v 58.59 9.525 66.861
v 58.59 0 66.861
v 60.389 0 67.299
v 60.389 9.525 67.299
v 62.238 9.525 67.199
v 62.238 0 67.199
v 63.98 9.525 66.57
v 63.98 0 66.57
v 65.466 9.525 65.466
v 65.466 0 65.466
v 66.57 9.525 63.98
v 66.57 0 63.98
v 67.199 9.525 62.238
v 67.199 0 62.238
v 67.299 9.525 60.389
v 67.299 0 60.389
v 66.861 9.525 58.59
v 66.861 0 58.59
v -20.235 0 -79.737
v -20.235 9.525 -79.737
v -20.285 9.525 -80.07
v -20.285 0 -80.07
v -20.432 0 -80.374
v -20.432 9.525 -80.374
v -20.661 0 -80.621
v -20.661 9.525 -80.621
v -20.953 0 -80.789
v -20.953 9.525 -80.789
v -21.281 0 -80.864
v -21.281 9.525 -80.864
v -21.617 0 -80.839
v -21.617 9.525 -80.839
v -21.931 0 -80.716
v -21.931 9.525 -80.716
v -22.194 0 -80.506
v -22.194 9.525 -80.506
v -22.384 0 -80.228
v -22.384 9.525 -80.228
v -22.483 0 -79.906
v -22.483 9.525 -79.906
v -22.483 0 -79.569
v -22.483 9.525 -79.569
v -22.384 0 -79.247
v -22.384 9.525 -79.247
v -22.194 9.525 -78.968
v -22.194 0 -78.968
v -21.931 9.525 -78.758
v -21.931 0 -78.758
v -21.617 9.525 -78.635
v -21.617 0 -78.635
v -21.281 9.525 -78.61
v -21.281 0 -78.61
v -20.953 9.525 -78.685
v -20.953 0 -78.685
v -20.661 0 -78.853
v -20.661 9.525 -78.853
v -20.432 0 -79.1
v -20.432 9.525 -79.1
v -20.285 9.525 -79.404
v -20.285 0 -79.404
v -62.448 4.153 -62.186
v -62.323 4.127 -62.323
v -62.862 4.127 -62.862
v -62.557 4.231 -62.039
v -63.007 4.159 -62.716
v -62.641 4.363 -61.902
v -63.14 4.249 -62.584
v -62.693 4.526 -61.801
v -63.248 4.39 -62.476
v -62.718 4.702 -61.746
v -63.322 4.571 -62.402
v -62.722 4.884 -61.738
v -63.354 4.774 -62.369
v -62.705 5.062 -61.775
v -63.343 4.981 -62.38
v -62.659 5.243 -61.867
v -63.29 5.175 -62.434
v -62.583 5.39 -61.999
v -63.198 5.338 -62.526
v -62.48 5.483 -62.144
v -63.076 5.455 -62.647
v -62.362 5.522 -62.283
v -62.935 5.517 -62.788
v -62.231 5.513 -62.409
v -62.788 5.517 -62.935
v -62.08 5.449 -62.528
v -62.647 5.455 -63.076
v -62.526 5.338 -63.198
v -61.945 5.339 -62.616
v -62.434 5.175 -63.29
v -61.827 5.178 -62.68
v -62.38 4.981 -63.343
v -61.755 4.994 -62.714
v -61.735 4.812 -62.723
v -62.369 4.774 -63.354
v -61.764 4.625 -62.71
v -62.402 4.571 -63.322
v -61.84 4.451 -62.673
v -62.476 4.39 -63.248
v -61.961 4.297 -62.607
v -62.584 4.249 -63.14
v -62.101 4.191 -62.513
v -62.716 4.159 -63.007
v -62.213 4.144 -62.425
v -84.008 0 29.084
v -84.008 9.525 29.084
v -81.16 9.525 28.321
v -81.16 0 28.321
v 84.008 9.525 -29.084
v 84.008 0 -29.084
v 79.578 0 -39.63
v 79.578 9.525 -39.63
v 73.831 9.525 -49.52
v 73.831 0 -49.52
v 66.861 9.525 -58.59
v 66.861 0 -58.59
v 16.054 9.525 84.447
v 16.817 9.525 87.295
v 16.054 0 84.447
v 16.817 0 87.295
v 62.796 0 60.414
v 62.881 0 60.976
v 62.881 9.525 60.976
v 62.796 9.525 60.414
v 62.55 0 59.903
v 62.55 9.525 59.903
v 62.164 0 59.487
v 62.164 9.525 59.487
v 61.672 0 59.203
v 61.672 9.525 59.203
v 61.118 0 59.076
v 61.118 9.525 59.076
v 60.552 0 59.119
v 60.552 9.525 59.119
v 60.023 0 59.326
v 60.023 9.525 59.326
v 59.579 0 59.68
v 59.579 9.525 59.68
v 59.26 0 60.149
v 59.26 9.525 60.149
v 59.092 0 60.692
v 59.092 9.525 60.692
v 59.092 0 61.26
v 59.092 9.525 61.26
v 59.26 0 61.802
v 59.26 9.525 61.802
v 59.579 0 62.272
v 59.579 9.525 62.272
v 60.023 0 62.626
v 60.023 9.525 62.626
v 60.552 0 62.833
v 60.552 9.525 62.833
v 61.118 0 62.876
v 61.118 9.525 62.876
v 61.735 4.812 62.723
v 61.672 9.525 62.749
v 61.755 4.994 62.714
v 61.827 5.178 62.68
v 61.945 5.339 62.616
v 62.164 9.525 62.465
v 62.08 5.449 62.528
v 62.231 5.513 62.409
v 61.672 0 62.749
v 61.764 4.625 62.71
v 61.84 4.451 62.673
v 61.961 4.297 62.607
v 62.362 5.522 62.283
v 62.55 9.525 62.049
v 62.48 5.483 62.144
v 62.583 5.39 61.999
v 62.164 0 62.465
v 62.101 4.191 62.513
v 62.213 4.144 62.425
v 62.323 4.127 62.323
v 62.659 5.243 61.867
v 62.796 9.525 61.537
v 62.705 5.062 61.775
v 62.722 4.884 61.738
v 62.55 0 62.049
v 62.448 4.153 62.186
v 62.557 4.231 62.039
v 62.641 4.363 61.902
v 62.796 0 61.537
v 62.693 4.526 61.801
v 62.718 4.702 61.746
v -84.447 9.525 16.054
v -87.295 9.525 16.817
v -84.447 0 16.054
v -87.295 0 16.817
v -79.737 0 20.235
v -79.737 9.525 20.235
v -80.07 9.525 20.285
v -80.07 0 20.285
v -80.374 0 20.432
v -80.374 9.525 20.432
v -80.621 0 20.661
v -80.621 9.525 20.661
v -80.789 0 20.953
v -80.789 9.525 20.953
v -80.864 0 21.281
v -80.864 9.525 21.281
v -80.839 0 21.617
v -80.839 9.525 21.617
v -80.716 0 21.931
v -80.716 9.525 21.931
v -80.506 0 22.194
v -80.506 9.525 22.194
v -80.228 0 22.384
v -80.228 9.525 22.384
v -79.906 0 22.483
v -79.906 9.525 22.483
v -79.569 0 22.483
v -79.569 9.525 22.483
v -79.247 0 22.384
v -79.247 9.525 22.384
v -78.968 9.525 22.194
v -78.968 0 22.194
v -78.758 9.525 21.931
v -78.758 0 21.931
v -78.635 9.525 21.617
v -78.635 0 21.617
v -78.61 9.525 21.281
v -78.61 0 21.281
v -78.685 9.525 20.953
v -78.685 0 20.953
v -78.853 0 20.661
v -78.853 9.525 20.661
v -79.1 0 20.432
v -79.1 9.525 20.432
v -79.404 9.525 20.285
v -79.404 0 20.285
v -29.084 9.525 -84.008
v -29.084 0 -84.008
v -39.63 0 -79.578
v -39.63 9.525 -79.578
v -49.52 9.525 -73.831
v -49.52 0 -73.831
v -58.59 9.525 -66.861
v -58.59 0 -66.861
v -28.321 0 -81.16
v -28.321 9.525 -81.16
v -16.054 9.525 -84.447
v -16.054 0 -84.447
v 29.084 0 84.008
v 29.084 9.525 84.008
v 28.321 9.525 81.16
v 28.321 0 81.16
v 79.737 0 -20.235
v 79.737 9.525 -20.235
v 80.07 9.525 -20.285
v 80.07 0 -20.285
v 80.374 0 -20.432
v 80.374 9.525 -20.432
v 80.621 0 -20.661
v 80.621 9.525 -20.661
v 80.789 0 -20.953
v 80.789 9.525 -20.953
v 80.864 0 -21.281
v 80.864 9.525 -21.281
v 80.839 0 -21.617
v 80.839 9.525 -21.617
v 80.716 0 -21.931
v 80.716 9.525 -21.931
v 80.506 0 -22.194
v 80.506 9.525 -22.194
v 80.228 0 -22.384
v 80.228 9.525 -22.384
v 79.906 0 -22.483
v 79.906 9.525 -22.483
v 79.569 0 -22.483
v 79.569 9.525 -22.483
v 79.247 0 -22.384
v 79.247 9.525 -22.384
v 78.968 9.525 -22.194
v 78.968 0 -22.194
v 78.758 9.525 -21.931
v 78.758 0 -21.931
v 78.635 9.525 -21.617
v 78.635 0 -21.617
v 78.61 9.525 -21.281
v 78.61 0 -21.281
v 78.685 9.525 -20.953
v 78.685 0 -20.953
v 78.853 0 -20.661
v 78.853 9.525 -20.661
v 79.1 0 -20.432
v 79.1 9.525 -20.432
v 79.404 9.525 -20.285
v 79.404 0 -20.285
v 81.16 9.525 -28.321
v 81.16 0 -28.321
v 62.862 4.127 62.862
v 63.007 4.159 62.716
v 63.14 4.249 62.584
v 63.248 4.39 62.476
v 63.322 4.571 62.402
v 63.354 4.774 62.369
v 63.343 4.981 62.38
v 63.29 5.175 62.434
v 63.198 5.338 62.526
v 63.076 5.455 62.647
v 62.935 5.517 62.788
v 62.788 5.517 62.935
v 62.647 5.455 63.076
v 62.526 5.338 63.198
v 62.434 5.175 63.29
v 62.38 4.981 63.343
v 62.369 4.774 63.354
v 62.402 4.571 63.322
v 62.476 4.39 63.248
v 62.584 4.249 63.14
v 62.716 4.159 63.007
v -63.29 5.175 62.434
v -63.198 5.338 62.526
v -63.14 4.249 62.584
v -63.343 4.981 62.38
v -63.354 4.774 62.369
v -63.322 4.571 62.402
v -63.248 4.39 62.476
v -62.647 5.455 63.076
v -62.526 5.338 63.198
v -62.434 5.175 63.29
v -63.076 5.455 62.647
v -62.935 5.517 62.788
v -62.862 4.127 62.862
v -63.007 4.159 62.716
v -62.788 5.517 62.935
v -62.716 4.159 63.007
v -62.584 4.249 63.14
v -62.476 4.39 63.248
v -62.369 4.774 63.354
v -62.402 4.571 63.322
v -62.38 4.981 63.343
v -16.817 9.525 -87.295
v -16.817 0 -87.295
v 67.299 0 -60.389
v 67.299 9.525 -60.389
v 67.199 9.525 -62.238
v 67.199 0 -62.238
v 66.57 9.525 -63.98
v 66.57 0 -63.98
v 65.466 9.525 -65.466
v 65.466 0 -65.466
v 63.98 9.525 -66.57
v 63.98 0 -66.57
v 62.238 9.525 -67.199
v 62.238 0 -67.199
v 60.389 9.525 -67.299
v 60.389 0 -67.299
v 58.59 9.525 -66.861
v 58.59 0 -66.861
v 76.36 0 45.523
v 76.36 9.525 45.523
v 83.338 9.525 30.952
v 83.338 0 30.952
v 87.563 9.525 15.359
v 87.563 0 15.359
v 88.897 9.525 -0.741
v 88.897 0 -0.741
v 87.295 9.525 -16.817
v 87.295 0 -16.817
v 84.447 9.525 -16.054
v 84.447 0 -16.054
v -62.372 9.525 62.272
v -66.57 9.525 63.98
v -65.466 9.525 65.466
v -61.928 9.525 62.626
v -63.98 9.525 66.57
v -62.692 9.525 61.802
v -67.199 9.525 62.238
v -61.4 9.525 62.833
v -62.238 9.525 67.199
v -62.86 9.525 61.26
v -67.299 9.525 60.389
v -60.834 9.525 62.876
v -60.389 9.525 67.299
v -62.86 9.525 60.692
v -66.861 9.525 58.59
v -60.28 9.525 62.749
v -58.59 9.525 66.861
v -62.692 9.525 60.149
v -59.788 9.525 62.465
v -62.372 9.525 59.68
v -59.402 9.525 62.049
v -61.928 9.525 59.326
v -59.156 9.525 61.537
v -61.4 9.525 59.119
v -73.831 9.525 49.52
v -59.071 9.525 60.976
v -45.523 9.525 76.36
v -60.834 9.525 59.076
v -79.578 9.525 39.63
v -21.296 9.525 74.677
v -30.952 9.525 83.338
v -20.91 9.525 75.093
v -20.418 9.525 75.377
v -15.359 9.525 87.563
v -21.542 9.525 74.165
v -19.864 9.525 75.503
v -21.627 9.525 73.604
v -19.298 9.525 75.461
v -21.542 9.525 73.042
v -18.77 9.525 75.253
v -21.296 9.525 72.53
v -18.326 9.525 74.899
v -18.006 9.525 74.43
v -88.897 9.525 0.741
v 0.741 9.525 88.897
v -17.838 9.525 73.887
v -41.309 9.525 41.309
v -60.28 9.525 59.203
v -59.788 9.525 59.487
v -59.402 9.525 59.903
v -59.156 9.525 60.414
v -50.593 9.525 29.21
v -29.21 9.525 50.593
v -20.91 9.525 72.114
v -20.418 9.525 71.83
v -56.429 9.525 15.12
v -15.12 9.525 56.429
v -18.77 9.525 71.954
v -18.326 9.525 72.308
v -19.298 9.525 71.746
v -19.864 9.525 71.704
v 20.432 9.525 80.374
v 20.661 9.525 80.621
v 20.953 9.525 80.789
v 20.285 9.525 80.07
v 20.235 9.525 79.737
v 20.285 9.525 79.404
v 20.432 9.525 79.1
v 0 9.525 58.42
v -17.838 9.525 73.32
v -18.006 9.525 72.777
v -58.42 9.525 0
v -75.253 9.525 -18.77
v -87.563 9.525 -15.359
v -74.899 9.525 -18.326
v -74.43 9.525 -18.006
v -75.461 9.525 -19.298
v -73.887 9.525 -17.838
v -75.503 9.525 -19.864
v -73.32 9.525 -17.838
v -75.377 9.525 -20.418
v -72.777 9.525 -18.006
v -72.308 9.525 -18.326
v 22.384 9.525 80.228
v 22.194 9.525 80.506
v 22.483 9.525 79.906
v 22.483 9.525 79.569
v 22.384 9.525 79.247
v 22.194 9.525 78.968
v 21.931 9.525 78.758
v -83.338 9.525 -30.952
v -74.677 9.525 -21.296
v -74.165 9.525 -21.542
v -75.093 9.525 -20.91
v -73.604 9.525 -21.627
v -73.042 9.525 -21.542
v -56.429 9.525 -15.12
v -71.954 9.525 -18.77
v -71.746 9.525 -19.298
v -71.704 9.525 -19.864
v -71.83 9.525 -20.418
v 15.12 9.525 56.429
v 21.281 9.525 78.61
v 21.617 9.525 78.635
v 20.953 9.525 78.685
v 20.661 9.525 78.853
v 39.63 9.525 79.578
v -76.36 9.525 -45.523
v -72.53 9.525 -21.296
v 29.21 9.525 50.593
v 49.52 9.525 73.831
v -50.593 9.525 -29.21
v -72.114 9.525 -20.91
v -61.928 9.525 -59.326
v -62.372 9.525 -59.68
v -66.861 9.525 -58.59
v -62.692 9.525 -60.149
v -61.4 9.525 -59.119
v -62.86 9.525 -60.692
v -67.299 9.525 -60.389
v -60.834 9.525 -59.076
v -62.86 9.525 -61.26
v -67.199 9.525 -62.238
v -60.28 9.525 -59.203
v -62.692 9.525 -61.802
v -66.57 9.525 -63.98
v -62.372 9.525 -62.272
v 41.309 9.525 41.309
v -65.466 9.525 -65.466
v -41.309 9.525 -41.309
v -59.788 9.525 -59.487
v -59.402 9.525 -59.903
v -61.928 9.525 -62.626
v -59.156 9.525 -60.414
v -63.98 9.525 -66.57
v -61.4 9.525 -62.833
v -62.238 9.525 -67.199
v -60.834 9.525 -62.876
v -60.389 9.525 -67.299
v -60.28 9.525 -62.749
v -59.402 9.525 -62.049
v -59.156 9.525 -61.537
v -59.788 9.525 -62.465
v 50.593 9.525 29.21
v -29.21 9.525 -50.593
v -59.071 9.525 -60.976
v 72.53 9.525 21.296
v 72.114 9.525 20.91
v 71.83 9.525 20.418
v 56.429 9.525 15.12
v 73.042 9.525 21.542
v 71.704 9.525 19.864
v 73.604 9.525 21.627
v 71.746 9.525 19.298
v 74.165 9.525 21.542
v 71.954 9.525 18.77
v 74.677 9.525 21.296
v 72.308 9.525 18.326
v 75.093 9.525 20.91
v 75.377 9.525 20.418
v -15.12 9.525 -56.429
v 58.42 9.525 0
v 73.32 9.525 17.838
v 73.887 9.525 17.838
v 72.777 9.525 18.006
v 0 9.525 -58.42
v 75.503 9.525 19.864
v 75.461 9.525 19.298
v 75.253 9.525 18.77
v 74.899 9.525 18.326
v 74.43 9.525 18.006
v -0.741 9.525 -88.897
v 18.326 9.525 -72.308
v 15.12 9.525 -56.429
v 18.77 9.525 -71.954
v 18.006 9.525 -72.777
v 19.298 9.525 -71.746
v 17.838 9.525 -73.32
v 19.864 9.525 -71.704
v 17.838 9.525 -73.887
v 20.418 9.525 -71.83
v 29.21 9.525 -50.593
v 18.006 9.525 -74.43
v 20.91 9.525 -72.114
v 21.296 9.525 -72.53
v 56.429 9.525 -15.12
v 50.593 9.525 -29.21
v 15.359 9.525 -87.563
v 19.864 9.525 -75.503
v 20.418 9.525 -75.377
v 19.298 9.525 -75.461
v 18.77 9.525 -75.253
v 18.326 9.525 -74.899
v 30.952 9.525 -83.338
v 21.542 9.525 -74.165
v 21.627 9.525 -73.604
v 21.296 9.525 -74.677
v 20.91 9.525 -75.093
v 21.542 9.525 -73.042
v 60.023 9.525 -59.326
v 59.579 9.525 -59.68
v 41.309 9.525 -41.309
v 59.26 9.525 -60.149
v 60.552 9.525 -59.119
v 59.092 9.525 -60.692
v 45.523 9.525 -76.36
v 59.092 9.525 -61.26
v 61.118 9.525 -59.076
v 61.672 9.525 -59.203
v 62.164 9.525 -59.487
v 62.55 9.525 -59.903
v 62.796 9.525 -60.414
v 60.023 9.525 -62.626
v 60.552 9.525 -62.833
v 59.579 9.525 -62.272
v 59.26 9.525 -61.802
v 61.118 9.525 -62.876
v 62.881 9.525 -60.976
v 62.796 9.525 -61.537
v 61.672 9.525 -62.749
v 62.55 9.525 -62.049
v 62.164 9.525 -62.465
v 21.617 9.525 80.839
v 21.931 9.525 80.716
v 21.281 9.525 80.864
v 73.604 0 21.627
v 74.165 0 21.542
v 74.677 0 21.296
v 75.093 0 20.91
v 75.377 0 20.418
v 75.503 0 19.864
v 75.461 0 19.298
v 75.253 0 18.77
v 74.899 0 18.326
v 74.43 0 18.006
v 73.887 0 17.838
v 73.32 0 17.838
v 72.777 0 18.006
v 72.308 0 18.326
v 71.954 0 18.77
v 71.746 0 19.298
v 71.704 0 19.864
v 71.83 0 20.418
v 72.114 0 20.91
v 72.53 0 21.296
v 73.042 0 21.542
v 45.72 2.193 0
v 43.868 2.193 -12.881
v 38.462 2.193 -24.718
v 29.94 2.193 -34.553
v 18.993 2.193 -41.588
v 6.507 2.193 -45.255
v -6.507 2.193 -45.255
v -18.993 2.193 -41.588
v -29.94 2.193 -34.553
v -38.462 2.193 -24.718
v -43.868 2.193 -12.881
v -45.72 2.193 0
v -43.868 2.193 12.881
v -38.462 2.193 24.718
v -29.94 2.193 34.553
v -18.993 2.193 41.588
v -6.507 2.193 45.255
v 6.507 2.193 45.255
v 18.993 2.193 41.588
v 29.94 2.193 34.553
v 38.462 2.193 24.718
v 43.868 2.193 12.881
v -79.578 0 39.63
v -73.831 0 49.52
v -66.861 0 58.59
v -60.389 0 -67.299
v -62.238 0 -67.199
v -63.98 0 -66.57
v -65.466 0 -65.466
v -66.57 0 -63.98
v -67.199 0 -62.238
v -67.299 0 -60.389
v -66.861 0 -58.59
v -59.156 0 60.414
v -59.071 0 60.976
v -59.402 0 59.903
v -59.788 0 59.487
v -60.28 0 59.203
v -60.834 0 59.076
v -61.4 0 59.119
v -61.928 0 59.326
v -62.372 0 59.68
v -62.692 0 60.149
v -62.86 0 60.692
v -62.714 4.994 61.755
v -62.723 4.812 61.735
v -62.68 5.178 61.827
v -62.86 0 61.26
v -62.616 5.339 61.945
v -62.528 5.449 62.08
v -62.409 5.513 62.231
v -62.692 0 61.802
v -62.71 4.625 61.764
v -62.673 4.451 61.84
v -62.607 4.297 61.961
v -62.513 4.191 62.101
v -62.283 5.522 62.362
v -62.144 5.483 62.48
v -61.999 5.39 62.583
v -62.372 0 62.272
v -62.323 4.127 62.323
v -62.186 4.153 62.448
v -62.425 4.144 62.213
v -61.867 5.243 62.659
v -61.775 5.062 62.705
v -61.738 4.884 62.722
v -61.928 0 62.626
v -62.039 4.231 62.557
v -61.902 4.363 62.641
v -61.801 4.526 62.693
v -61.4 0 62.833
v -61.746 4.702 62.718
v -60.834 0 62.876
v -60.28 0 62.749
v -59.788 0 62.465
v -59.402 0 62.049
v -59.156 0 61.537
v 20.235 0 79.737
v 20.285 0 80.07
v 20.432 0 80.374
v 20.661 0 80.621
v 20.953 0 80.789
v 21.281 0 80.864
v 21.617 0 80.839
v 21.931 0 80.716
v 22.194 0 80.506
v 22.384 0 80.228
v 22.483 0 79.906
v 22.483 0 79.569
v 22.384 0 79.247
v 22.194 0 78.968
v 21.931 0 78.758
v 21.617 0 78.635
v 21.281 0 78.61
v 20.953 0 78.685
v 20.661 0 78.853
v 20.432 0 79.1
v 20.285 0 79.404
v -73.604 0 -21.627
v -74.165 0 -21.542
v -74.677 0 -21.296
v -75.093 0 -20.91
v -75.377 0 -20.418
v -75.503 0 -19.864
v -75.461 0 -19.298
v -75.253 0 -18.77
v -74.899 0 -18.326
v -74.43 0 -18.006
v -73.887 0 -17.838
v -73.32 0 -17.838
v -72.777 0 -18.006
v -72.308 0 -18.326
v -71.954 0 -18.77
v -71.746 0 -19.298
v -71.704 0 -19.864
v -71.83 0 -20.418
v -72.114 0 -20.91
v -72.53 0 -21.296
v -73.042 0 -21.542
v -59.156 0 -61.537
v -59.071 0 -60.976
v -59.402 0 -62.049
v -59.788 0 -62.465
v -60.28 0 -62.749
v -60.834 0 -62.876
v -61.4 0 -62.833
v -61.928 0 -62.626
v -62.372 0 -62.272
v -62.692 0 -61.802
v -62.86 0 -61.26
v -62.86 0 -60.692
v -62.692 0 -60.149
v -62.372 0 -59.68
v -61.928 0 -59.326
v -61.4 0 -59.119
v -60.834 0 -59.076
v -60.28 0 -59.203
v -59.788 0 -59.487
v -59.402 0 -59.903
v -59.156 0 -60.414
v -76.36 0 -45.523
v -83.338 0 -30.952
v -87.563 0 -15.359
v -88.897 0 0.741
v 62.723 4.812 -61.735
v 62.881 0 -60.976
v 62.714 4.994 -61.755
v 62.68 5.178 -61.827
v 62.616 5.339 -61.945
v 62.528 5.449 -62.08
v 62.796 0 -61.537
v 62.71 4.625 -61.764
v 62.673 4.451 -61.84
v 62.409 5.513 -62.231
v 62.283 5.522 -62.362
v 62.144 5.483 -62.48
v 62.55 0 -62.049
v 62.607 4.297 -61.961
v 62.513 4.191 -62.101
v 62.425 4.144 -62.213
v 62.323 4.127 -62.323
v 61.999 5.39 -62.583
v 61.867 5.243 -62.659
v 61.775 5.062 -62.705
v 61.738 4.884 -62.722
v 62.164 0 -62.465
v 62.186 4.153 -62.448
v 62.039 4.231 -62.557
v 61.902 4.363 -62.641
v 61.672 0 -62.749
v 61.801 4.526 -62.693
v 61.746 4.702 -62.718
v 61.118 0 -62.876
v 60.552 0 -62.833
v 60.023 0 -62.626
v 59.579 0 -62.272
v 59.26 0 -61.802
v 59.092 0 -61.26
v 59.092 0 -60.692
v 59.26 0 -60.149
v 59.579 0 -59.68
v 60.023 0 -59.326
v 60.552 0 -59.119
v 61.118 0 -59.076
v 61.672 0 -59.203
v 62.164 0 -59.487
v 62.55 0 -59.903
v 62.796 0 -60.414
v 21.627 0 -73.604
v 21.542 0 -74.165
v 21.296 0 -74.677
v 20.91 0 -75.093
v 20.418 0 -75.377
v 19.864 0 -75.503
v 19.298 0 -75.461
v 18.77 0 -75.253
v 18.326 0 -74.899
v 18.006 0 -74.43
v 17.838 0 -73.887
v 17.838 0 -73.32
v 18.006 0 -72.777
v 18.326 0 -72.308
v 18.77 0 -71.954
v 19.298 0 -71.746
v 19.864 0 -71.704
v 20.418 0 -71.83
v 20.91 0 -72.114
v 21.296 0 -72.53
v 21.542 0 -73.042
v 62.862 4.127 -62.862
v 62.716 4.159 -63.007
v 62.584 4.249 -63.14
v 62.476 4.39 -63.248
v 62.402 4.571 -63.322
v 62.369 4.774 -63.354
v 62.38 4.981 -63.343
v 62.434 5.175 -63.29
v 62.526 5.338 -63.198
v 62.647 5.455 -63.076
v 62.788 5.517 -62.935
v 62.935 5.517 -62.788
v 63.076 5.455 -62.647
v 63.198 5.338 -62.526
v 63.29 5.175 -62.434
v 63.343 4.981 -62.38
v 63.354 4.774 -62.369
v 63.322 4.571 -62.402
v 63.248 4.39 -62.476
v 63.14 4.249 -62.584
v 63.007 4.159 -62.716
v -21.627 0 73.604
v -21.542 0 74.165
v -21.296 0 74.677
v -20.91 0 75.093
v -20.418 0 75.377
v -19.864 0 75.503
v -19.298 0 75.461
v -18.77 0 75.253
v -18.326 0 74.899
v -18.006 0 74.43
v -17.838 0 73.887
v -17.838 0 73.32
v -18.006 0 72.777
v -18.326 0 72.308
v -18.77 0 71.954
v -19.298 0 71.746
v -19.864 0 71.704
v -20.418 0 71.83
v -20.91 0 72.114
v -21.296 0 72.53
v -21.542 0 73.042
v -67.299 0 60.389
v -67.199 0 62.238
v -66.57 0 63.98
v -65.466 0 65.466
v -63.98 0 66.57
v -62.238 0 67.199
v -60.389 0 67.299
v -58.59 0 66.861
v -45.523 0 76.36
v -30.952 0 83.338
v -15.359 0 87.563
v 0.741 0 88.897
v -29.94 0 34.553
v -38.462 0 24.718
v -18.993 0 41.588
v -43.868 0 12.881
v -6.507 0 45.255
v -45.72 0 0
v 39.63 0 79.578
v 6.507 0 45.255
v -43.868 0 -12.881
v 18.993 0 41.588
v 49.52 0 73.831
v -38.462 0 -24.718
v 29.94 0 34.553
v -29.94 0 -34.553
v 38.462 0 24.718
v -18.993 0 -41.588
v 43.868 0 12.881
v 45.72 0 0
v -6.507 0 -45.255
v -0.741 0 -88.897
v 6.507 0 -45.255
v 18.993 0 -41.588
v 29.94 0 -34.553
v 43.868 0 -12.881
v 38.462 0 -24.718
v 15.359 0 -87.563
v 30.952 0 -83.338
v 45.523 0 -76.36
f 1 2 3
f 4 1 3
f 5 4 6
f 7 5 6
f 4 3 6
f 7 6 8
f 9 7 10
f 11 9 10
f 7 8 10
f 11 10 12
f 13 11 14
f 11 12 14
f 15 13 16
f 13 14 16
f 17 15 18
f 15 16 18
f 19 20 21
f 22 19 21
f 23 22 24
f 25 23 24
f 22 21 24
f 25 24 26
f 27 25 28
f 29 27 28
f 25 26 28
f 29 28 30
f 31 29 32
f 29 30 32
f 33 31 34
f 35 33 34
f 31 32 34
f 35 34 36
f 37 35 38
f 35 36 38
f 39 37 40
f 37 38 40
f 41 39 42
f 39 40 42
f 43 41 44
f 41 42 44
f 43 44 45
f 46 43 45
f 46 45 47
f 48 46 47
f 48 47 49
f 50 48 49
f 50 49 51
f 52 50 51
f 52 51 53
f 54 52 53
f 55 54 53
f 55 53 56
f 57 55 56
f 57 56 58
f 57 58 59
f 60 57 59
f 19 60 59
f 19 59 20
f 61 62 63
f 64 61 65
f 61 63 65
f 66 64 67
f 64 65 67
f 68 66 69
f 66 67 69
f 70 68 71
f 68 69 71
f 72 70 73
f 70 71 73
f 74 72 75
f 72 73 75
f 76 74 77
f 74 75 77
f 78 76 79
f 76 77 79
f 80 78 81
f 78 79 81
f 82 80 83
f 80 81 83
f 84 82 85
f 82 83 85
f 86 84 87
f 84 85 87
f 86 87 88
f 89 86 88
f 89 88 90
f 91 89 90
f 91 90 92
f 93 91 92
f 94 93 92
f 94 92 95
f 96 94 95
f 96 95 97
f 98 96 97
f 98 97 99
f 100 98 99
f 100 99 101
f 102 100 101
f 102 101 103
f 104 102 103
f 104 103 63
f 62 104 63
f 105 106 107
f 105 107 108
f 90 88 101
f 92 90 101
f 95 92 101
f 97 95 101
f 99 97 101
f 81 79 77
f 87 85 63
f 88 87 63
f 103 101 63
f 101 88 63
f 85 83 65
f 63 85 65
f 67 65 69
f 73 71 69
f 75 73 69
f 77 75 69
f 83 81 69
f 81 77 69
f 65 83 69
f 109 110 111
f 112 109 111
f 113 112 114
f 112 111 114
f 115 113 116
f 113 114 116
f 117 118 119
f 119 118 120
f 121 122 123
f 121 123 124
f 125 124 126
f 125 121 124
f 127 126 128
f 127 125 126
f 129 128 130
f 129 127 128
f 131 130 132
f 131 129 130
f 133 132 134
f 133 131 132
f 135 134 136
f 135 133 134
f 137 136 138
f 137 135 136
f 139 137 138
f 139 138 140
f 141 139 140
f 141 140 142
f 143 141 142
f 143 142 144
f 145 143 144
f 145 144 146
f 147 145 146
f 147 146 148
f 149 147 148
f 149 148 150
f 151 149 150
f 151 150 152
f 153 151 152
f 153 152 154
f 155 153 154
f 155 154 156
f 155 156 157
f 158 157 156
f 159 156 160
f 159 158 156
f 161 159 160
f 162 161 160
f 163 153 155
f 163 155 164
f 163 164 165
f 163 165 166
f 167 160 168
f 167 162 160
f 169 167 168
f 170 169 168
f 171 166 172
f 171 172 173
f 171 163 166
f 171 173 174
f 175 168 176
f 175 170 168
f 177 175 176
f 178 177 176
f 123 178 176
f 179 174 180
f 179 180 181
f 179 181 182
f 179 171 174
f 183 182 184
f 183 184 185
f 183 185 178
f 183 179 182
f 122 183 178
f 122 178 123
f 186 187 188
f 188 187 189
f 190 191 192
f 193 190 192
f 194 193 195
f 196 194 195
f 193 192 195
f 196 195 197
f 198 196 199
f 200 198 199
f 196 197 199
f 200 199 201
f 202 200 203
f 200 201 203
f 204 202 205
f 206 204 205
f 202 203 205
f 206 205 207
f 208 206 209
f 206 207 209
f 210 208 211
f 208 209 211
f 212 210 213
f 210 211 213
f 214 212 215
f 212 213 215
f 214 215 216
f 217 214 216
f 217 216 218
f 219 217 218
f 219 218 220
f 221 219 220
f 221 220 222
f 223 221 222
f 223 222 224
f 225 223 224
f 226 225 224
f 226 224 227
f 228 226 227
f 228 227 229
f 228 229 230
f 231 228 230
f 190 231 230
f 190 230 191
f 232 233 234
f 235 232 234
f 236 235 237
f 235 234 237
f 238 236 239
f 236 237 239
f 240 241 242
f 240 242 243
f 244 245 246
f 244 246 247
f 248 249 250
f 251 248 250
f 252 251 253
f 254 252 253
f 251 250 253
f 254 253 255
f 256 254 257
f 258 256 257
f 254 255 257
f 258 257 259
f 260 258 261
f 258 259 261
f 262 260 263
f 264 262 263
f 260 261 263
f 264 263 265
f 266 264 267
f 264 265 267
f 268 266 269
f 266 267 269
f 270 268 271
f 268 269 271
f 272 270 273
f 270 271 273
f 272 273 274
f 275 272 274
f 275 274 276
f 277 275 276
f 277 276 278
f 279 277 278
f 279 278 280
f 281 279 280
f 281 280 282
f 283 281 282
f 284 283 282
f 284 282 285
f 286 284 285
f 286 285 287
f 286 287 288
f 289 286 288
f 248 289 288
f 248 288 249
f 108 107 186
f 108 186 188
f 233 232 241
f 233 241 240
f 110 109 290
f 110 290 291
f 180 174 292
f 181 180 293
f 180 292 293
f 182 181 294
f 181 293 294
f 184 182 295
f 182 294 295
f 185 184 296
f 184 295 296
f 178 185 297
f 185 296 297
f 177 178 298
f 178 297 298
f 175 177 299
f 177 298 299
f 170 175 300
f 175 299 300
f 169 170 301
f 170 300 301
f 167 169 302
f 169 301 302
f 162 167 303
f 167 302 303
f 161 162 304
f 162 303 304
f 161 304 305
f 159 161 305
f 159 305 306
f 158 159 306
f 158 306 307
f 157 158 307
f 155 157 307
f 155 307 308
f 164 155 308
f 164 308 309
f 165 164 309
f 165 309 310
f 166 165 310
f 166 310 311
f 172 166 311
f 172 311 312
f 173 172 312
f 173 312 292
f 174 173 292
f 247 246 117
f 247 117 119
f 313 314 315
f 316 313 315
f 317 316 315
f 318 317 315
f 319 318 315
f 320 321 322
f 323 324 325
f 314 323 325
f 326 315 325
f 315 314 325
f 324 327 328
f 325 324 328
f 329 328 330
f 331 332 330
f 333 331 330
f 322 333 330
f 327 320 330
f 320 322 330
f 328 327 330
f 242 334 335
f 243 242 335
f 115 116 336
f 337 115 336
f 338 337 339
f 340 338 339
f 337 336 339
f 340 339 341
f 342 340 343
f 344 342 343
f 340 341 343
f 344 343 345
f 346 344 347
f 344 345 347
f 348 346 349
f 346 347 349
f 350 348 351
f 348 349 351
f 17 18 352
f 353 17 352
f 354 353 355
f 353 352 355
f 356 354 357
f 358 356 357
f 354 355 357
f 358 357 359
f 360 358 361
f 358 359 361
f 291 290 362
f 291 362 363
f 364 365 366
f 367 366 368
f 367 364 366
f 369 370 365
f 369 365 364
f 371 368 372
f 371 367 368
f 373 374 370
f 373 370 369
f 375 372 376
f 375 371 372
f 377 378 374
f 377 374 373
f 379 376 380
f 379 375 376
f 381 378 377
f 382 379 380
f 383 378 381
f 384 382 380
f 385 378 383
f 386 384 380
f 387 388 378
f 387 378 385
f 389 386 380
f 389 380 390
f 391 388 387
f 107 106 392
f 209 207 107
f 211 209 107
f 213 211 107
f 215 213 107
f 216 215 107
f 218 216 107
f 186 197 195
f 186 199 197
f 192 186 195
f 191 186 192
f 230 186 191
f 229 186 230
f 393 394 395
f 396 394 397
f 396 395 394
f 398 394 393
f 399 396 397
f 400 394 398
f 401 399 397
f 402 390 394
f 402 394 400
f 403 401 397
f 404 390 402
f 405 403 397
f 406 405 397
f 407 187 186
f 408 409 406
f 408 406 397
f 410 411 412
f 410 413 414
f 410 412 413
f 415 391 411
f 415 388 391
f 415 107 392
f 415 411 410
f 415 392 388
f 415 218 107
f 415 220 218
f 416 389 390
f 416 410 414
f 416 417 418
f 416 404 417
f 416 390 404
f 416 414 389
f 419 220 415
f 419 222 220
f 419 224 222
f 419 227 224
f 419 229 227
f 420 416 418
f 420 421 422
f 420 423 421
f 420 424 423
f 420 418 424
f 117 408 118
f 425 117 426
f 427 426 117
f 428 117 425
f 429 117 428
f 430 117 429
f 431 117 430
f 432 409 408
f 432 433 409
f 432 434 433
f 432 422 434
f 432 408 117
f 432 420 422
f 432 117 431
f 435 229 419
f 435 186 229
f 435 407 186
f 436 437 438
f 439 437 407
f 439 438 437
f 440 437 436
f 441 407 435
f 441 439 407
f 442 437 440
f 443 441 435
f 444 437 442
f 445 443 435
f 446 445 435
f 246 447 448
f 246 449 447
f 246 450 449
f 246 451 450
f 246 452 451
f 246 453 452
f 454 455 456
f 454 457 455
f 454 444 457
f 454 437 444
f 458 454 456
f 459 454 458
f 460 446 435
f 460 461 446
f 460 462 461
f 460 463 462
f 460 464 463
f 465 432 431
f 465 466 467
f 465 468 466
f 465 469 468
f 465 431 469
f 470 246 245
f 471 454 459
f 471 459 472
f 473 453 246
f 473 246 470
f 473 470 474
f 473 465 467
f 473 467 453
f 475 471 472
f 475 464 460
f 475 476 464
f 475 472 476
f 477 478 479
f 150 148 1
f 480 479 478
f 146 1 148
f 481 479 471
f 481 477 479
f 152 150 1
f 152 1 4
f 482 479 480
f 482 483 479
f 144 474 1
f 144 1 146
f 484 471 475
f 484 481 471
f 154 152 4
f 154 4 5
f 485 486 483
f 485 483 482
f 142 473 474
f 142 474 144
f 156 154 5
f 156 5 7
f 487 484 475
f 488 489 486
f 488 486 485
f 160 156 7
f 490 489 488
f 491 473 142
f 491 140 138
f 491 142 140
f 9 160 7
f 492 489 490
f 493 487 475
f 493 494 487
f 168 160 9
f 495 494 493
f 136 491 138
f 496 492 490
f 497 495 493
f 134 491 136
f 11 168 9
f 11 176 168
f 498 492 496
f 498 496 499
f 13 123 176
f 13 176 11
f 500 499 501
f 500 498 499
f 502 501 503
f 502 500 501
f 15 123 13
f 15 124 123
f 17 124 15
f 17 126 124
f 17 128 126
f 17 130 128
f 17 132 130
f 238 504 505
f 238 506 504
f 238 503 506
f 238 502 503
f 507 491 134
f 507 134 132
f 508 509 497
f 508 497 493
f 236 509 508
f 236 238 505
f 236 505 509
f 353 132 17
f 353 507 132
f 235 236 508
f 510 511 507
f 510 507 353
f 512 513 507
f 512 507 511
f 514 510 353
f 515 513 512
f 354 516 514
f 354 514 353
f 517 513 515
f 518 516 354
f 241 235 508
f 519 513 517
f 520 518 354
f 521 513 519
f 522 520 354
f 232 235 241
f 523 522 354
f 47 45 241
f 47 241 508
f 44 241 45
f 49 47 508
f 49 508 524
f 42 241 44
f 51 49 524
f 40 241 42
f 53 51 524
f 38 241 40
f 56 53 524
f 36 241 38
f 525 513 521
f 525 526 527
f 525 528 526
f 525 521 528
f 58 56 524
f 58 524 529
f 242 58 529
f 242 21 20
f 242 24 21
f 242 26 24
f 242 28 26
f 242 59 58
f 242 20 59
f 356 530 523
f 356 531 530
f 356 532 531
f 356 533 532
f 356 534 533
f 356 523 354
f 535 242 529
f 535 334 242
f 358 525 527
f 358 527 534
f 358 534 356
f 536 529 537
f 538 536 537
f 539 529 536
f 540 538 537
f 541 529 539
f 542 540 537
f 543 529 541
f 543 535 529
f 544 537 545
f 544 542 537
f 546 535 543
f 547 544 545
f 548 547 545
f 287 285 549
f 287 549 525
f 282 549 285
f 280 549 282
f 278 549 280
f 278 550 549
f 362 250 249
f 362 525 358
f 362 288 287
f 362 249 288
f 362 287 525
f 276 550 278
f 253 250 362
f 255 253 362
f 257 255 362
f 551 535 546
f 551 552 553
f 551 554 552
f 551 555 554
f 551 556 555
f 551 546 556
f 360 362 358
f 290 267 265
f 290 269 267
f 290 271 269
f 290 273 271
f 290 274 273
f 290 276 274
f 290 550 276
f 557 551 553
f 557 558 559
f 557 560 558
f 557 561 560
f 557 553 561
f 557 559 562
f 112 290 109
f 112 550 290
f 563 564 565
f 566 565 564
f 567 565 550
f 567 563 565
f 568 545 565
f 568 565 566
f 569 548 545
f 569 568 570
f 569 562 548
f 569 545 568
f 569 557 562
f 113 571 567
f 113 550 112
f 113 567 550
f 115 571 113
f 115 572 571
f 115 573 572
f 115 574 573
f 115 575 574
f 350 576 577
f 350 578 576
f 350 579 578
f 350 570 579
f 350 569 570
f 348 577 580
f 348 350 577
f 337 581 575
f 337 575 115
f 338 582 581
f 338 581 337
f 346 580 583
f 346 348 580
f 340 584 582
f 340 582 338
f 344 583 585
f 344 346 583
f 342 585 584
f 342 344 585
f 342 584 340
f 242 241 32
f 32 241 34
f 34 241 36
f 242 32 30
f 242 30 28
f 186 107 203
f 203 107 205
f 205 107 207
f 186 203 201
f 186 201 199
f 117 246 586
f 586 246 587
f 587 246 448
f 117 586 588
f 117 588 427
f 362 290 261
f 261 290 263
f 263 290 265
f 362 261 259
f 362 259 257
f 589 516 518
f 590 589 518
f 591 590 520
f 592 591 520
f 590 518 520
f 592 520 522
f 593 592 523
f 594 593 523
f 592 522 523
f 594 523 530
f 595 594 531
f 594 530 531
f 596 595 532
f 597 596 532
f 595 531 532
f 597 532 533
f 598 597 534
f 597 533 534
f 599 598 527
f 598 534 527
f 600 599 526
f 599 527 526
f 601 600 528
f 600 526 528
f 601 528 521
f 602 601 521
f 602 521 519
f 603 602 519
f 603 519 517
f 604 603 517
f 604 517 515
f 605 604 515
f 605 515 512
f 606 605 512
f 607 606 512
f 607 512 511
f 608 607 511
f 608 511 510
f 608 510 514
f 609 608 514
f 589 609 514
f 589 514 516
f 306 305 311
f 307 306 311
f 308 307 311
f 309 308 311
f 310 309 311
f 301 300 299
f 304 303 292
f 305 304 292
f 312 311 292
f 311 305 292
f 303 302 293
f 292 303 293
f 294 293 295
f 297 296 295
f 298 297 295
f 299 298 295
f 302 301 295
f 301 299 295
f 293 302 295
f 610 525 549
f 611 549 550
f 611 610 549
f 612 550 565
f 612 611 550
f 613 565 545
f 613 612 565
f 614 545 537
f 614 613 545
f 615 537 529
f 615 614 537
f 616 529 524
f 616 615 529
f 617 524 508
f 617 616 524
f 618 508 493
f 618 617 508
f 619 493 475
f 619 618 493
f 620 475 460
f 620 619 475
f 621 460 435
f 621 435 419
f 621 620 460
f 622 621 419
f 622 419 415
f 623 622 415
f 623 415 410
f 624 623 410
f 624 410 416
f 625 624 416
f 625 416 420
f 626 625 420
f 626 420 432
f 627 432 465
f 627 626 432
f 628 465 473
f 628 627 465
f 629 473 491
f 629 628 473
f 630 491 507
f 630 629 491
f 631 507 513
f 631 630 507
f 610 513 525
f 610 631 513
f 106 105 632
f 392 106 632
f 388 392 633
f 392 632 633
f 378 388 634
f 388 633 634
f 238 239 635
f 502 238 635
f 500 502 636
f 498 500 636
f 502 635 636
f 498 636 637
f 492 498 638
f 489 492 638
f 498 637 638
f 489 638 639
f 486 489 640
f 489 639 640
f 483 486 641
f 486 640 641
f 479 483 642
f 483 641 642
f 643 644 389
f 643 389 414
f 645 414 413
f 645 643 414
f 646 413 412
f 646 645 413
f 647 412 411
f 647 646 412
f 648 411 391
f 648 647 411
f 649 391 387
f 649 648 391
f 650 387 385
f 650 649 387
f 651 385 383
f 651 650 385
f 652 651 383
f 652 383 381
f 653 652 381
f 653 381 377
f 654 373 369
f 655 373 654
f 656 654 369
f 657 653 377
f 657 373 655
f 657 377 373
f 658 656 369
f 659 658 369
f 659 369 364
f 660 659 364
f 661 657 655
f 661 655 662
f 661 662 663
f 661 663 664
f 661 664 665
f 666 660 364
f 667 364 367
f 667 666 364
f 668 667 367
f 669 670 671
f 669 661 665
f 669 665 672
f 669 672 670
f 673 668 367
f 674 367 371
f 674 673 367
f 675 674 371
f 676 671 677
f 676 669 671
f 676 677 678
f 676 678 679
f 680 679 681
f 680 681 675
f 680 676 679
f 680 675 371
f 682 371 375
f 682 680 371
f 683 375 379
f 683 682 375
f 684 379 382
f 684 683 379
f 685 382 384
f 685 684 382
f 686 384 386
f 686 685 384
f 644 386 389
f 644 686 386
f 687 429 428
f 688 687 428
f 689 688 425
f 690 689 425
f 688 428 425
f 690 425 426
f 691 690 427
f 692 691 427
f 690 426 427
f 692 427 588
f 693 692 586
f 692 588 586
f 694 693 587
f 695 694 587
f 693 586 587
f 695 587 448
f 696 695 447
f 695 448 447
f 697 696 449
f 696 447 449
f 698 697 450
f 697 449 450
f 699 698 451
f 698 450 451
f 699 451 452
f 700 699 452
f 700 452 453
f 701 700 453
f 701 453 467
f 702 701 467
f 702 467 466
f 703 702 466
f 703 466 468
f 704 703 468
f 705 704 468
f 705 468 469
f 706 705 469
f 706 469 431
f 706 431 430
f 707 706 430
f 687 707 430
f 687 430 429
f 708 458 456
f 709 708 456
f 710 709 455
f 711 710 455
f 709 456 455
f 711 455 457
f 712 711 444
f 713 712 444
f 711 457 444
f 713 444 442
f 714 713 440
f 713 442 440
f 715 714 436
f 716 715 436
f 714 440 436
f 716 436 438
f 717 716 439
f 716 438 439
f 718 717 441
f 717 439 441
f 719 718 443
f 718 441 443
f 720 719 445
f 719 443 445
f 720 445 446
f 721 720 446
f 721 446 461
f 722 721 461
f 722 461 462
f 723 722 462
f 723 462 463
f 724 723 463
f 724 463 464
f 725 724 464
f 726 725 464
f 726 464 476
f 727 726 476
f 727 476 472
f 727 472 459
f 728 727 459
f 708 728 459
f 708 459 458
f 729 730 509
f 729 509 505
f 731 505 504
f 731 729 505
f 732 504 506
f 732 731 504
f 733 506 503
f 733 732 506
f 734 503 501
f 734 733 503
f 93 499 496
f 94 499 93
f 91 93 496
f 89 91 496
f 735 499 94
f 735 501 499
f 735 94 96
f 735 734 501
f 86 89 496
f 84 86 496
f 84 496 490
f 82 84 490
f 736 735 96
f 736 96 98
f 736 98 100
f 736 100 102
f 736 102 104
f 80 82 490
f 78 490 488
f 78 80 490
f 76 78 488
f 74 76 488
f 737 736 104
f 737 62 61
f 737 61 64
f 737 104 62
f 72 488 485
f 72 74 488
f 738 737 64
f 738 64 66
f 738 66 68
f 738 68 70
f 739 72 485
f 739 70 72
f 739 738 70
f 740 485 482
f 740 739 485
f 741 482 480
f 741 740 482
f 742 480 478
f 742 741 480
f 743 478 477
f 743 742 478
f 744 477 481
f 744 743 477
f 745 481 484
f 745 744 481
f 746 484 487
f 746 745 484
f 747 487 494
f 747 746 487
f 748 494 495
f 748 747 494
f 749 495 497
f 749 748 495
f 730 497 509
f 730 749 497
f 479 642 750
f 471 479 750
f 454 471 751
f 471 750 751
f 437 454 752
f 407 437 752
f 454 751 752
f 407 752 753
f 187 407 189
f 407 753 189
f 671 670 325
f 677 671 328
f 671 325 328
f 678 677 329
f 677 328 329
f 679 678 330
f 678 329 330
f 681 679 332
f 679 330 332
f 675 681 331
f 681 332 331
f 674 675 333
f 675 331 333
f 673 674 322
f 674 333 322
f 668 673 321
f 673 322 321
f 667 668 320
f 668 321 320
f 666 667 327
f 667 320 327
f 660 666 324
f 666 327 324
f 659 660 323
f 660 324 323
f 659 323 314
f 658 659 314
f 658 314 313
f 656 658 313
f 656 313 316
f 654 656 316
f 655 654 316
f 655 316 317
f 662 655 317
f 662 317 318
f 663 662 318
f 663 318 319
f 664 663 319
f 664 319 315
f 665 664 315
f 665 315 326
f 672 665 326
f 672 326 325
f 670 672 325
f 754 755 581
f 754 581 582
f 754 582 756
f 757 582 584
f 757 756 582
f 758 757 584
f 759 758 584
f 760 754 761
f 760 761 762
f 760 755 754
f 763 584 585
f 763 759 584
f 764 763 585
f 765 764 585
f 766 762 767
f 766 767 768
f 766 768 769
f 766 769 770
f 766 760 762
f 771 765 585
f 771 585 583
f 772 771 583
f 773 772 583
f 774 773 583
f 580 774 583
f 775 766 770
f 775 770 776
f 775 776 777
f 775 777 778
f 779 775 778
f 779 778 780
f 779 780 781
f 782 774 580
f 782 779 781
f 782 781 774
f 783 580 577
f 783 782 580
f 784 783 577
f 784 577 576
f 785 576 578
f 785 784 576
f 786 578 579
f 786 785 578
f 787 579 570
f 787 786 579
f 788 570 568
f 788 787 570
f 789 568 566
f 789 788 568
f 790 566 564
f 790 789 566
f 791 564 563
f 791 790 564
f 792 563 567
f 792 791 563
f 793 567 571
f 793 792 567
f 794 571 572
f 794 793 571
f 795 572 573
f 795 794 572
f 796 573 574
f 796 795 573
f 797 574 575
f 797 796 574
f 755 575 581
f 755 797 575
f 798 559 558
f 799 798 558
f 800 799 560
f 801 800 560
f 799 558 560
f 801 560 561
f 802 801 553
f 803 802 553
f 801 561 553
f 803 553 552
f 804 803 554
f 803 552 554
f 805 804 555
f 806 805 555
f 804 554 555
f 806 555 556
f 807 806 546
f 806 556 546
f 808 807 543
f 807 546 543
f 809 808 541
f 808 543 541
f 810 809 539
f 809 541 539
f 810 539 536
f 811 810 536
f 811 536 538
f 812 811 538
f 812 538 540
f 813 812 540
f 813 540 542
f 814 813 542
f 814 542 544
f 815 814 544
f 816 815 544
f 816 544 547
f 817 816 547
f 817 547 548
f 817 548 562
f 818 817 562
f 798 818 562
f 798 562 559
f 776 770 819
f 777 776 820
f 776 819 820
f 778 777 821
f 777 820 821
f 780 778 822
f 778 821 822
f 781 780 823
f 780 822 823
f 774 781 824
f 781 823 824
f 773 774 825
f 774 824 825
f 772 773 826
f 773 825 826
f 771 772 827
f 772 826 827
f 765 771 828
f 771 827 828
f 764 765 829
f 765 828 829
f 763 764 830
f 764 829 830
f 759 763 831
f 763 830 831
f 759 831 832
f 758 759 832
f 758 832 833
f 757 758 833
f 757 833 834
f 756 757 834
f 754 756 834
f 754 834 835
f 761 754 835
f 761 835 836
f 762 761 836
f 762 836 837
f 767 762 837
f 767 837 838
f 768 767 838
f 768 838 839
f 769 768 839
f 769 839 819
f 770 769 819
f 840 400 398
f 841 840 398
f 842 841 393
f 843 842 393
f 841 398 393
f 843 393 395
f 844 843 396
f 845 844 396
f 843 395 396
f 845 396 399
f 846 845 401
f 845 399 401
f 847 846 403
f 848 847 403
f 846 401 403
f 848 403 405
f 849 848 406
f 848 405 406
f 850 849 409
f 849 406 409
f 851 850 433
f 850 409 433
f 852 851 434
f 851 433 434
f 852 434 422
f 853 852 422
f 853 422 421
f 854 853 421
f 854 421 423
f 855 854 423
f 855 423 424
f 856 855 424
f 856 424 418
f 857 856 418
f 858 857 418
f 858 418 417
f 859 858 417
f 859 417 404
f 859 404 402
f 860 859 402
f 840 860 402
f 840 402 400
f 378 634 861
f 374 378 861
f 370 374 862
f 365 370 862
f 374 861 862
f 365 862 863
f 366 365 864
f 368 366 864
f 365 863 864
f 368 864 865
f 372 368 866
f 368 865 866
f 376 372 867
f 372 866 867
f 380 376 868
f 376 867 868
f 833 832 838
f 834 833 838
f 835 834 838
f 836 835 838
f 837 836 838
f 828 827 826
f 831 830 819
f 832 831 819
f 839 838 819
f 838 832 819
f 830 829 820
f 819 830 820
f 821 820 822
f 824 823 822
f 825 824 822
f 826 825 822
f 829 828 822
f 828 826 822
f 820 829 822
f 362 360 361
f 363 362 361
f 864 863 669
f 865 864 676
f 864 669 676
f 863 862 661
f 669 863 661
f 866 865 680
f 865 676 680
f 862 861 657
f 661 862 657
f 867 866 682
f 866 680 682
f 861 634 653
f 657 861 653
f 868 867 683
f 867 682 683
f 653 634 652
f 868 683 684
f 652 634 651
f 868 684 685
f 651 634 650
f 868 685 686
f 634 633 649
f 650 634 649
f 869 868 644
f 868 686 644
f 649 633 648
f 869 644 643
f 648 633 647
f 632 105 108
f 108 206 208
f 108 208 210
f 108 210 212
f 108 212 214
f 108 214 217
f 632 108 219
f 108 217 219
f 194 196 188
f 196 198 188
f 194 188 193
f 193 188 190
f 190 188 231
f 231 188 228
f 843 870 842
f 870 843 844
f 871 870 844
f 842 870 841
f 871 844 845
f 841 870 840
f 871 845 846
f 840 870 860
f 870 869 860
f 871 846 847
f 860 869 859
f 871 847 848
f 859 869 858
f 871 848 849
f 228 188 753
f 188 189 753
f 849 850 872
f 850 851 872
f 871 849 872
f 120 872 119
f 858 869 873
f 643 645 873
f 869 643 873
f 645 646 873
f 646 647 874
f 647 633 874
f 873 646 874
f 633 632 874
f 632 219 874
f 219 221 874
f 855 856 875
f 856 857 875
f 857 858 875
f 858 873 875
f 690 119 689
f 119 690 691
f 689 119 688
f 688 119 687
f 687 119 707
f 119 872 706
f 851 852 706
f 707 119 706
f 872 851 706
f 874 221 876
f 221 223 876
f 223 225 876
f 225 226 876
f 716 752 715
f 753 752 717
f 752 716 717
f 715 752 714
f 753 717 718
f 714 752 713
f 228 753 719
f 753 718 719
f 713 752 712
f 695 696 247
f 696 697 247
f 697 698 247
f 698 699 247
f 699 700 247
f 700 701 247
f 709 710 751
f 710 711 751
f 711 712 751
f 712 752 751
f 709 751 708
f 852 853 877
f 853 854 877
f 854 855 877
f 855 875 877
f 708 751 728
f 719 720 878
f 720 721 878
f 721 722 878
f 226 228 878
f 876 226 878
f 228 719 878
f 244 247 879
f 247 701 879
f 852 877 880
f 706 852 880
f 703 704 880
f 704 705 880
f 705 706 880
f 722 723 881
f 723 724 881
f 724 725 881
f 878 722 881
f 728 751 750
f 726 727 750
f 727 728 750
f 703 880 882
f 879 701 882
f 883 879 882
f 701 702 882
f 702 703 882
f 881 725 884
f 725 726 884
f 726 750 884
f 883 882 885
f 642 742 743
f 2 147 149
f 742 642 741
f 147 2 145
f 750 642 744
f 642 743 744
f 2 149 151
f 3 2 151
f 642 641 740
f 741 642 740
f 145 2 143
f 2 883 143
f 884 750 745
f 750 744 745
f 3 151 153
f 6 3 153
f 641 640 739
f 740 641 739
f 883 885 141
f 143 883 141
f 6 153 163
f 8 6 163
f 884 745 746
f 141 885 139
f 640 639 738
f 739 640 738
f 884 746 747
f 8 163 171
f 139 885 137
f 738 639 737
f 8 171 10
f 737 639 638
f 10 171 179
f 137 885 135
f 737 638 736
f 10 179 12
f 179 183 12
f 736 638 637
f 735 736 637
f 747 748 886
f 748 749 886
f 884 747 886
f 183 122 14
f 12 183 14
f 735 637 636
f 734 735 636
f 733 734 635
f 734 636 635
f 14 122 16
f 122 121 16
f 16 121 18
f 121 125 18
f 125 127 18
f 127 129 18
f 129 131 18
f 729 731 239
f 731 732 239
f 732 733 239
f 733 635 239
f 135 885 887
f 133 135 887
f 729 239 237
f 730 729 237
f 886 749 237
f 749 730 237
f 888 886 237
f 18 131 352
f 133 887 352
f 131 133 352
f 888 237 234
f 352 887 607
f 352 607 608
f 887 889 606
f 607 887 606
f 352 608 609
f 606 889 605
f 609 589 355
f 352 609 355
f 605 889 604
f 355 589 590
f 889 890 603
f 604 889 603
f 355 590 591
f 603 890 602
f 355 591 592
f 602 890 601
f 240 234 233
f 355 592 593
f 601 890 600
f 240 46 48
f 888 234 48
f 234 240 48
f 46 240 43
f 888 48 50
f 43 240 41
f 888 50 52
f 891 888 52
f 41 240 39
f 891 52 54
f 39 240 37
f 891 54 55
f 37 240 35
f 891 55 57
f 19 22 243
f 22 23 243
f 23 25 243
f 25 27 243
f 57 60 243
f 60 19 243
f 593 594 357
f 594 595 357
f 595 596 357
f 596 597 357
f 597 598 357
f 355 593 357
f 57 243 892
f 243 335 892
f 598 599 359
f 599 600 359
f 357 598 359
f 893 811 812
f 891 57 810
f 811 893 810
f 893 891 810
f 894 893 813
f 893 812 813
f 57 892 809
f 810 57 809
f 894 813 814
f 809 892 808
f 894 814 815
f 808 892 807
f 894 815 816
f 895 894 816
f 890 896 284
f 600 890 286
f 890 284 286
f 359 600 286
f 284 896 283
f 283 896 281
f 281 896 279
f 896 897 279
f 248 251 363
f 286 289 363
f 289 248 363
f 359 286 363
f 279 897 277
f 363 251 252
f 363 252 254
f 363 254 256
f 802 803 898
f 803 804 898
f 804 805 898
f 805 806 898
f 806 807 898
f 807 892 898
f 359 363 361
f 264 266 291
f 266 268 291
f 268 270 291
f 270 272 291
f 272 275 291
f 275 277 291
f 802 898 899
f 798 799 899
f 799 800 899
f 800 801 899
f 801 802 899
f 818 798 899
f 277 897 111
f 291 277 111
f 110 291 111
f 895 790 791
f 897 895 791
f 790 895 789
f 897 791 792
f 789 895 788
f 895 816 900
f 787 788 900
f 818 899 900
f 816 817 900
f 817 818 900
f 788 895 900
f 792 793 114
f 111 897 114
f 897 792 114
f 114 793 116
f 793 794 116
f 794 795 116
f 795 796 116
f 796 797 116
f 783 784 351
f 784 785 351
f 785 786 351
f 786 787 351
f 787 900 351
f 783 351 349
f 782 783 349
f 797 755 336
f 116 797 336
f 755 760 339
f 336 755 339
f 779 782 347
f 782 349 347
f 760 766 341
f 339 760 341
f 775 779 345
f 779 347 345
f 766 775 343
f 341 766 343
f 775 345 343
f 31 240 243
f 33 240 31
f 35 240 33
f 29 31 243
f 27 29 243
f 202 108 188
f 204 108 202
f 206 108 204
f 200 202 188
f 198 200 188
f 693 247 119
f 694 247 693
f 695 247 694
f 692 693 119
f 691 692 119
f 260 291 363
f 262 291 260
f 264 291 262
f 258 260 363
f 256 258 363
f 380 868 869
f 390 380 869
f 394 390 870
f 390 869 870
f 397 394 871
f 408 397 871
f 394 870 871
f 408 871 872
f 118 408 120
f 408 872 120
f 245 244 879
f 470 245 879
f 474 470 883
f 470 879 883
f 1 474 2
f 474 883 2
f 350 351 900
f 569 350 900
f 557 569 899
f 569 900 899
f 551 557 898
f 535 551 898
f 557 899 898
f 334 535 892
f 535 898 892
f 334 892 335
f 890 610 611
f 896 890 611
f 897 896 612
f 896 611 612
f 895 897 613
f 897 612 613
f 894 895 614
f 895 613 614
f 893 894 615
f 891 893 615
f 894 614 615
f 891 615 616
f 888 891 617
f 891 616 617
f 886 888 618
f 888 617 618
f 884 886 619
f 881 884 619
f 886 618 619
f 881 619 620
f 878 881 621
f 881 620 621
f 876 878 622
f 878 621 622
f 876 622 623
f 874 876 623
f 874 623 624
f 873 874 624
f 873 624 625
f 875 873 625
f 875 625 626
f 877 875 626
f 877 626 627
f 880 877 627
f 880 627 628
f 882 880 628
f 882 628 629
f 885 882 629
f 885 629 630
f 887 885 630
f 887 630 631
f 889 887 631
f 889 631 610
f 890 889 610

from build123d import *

# Parameters (mm, degrees)
SKETCH1_R           = 1.905
BOSS_EXTRUDE1_DEPTH = 9.525
SKETCH2_R           = 45.72
CUT_EXTRUDE1_DEPTH  = 12.7
SKETCH10_R          = 0.6985
CUT_EXTRUDE5_DEPTH  = 3.175
CIRPATTERN5_COUNT   = 4
CHAMFER1_SIZE       = 12.7
CHAMFER1_SIZE2      = 7.332348419
SKETCH4_R           = 1.905
CUT_EXTRUDE6_DEPTH  = 10.5250001
CIRPATTERN6_COUNT   = 4
SKETCH13_R          = 1.1303
CUT_EXTRUDE7_DEPTH  = 10.5250001
CIRPATTERN7_COUNT   = 4
SKETCH14_W          = 11.95230377
SKETCH14_H          = 12.7
CUT_EXTRUDE8_DEPTH  = 3.175
CIRPATTERN8_COUNT   = 4


with BuildPart() as part:
    # Sketch1 → Boss-Extrude1 (new body)
    with BuildSketch(Plane(origin=(0, 0, 0), x_dir=(1, 0, 0), z_dir=(0, 1, 0))):
        with BuildLine():
            ThreePointArc((-66.860826677, 58.590441679), (-88.9, 0), (-66.860826677, -58.590441679))
            ThreePointArc((-66.860826677, -58.590441679), (-65.466067123, -65.466067123), (-58.590441679, -66.860826677))
            ThreePointArc((-58.590441679, -66.860826677), (0, -88.9), (58.590441679, -66.860826677))
            ThreePointArc((58.590441679, -66.860826677), (65.466067123, -65.466067123), (66.860826677, -58.590441679))
            ThreePointArc((66.860826677, -58.590441679), (88.9, 0), (66.860826677, 58.590441679))
            ThreePointArc((66.860826677, 58.590441679), (65.466067123, 65.466067123), (58.590441679, 66.860826677))
            ThreePointArc((58.590441679, 66.860826677), (0, 88.9), (-58.590441679, 66.860826677))
            ThreePointArc((-58.590441679, 66.860826677), (-65.466067123, 65.466067123), (-66.860826677, 58.590441679))
        make_face()
        with Locations((-60.975939062, 60.975939062)):
            Circle(SKETCH1_R, mode=Mode.SUBTRACT)
        with Locations((60.975939062, 60.975939062)):
            Circle(SKETCH1_R, mode=Mode.SUBTRACT)
        with Locations((60.975939062, -60.975939062)):
            Circle(SKETCH1_R, mode=Mode.SUBTRACT)
        with Locations((-60.975939062, -60.975939062)):
            Circle(SKETCH1_R, mode=Mode.SUBTRACT)
    extrude(amount=BOSS_EXTRUDE1_DEPTH)

    # Sketch2 → Cut-Extrude1 (cut)
    with BuildSketch(Plane(origin=(0, 9.525, 0), x_dir=(1, 0, 0), z_dir=(0, 1, 0))):
        Circle(SKETCH2_R)
    extrude(amount=-CUT_EXTRUDE1_DEPTH, mode=Mode.SUBTRACT)

    # Sketch10 → Cut-Extrude5 (cut)
    with BuildSketch(Plane(origin=(-62.861792847, 0, -62.861792847), x_dir=(0, -1, 0), z_dir=(-0.707106781, 0, -0.707106781))):
        with Locations((-4.826, 0)):
            Circle(SKETCH10_R)
    cut_extrude5 = extrude(amount=-CUT_EXTRUDE5_DEPTH, mode=Mode.SUBTRACT)

    # CirPattern5: Cut-Extrude5 ×4 about axis
    cirpattern5_axis = Axis((0, 0, 0), (0, 1, 0))
    for i in range(1, CIRPATTERN5_COUNT):
        add(cut_extrude5.rotate(cirpattern5_axis, i * 360 / CIRPATTERN5_COUNT), mode=Mode.SUBTRACT)

    # Chamfer1
    chamfer1_edges = [part.edges().sort_by_distance(p)[0] for p in [
        (-45.72, 9.525, 0),
    ]]
    chamfer1_side = [part.faces().sort_by_distance(p)[0] for p in [
        (0, 9.525, -86.385528286),
    ]]
    chamfer(chamfer1_edges, length=CHAMFER1_SIZE, length2=CHAMFER1_SIZE2, reference=chamfer1_side[0])

    # Sketch4 → Cut-Extrude6 (cut, through all)
    with BuildSketch(Plane(origin=(0, 9.525, 0), x_dir=(1, 0, 0), z_dir=(0, 1, 0))):
        with Locations((19.722011237, 73.603547963)):
            Circle(SKETCH4_R)
    cut_extrude6 = extrude(amount=-CUT_EXTRUDE6_DEPTH, mode=Mode.SUBTRACT)

    # CirPattern6: Cut-Extrude6 ×4 about axis
    cirpattern6_axis = Axis((0, 0, 0), (0, 1, 0))
    for i in range(1, CIRPATTERN6_COUNT):
        add(cut_extrude6.rotate(cirpattern6_axis, i * 360 / CIRPATTERN6_COUNT), mode=Mode.SUBTRACT)

    # Sketch13 → Cut-Extrude7 (cut, through all)
    with BuildSketch(Plane(origin=(0, 9.525, 0), x_dir=(1, 0, 0), z_dir=(0, 1, 0))):
        with Locations((-21.365512173, 79.73717696)):
            Circle(SKETCH13_R)
    cut_extrude7 = extrude(amount=-CUT_EXTRUDE7_DEPTH, mode=Mode.SUBTRACT)

    # CirPattern7: Cut-Extrude7 ×4 about axis
    cirpattern7_axis = Axis((0, 0, 0), (0, 1, 0))
    for i in range(1, CIRPATTERN7_COUNT):
        add(cut_extrude7.rotate(cirpattern7_axis, i * 360 / CIRPATTERN7_COUNT), mode=Mode.SUBTRACT)

    # Sketch14 → Cut-Extrude8 (cut)
    with BuildSketch(Plane(origin=(-23.00901311, 0, -85.870805957), x_dir=(0, -1, 0), z_dir=(-0.258819045, 0, -0.965925826))):
        with Locations((-4.621692603, 0)):
            Rectangle(SKETCH14_W, SKETCH14_H)
    cut_extrude8 = extrude(amount=-CUT_EXTRUDE8_DEPTH, mode=Mode.SUBTRACT)

    # CirPattern8: Cut-Extrude8 ×4 about axis
    cirpattern8_axis = Axis((0, 0, 0), (0, 1, 0))
    for i in range(1, CIRPATTERN8_COUNT):
        add(cut_extrude8.rotate(cirpattern8_axis, i * 360 / CIRPATTERN8_COUNT), mode=Mode.SUBTRACT)


solid = part.part
